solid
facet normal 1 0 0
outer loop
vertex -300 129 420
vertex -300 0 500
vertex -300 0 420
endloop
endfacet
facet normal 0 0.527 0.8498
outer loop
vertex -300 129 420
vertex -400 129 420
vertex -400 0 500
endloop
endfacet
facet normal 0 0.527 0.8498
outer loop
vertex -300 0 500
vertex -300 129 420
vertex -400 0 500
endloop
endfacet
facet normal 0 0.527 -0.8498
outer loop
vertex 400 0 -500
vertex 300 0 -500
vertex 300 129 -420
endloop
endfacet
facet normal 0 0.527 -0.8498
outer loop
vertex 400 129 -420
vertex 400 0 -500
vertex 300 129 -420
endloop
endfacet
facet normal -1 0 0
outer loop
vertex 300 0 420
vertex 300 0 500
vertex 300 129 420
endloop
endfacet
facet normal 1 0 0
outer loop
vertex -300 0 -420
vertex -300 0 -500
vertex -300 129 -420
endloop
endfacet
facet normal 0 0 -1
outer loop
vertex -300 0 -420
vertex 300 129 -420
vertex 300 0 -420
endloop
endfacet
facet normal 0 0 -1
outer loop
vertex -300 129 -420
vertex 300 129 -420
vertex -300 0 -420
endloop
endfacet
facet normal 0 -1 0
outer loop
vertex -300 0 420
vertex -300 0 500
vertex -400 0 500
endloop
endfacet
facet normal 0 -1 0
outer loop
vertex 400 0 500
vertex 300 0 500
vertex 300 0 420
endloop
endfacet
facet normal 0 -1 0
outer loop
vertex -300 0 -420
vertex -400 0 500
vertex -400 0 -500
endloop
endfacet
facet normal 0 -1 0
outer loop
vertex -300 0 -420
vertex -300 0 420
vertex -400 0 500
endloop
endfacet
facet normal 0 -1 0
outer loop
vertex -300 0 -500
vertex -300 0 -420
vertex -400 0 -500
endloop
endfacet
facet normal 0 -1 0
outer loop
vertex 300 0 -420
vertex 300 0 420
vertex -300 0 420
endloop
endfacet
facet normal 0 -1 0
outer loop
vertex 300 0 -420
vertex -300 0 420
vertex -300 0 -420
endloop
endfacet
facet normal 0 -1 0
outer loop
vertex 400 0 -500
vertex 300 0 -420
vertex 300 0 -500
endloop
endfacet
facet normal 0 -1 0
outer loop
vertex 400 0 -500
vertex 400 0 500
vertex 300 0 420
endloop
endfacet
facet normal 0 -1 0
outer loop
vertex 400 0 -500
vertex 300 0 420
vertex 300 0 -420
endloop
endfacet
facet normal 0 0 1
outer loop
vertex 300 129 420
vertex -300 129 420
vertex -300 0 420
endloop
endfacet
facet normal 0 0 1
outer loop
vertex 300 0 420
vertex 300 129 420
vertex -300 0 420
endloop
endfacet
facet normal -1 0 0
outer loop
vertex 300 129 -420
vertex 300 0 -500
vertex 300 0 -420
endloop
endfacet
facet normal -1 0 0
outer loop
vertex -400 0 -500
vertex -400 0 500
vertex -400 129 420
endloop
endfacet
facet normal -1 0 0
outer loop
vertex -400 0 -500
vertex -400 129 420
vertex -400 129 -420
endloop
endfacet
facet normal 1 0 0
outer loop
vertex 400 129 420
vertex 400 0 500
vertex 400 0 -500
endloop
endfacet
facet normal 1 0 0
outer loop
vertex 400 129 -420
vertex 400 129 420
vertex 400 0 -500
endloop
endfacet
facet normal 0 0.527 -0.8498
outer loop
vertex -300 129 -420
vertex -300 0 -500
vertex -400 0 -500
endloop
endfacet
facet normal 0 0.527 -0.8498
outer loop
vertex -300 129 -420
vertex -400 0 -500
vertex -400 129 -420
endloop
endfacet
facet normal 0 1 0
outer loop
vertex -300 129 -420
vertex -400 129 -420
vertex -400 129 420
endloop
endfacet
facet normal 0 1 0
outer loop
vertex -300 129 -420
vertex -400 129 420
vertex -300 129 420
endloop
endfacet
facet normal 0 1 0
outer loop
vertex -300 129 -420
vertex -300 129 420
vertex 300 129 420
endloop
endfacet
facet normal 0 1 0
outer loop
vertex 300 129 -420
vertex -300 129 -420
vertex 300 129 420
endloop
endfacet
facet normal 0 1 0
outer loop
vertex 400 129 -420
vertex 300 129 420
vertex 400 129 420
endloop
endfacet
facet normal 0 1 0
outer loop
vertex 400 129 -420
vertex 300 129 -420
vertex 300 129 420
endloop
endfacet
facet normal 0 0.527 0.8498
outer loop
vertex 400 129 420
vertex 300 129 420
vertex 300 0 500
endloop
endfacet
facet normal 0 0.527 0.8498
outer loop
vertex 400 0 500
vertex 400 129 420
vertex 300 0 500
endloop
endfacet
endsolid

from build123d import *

# Parameters (mm, degrees)
SKETCH1_W           = 800
SKETCH1_H           = 1000
BOSS_EXTRUDE1_DEPTH = 129
CUT_EXTRUDE1_DEPTH  = 800
SKETCH17_W          = 600
SKETCH17_H          = 151.792621691
CUT_EXTRUDE2_DEPTH  = 275
SKETCH25_W          = 600
SKETCH25_H          = 129
CUT_EXTRUDE4_DEPTH  = 80
CUT_EXTRUDE5_DEPTH  = 100
CUT_EXTRUDE6_DEPTH  = 100
BOSS_EXTRUDE4_DEPTH = 600


with BuildPart() as part:
    # Sketch1 → Boss-Extrude1 (new body)
    with BuildSketch(Plane(origin=(0, 0, 0), x_dir=(1, 0, 0), z_dir=(0, 1, 0))):
        Rectangle(SKETCH1_W, SKETCH1_H)
    extrude(amount=BOSS_EXTRUDE1_DEPTH)

    # Sketch2 → Cut-Extrude1 (cut)
    with BuildSketch(Plane.ZY.offset(400)):
        Polygon((420, 129), (500, 0), (500, 129), align=None)
    extrude(amount=-CUT_EXTRUDE1_DEPTH, mode=Mode.SUBTRACT)

    # Sketch17 → Cut-Extrude2 (cut)
    with BuildSketch(Plane(origin=(0, 223.948613341, 361.117139013), x_dir=(1, 0, 0), z_dir=(0, 0.5270348394308224, 0.849843678582201))):
        with Locations((0, -187.62110887)):
            Rectangle(SKETCH17_W, SKETCH17_H)
    extrude(amount=-CUT_EXTRUDE2_DEPTH, mode=Mode.SUBTRACT)

    # Sketch25 → Cut-Extrude4 (cut)
    with BuildSketch(Plane(origin=(0, 0, -500), x_dir=(-1, 0, 0), z_dir=(0, 0, -1))):
        with Locations((0, 64.5)):
            Rectangle(SKETCH25_W, SKETCH25_H)
    extrude(amount=-CUT_EXTRUDE4_DEPTH, mode=Mode.SUBTRACT)

    # Sketch28 → Cut-Extrude5 (cut)
    with BuildSketch(Plane(origin=(-300, 0, 0), x_dir=(0, 0, -1), z_dir=(1, 0, 0))):
        Polygon((420, 129), (500, 129), (500, 0), align=None)
    extrude(amount=-CUT_EXTRUDE5_DEPTH, mode=Mode.SUBTRACT)

    # Sketch29 → Cut-Extrude6 (cut)
    with BuildSketch(Plane.ZY.offset(-300)):
        Polygon((-420, 129), (-500, 129), (-500, 0), align=None)
    extrude(amount=-CUT_EXTRUDE6_DEPTH, mode=Mode.SUBTRACT)

    # Sketch31 → Boss-Extrude4 (add)
    with BuildSketch(Plane.ZY.offset(-300)):
        Polygon((420, 129), (420, 0), (211.9875, 0), align=None)
    extrude(amount=BOSS_EXTRUDE4_DEPTH)


solid = part.part
